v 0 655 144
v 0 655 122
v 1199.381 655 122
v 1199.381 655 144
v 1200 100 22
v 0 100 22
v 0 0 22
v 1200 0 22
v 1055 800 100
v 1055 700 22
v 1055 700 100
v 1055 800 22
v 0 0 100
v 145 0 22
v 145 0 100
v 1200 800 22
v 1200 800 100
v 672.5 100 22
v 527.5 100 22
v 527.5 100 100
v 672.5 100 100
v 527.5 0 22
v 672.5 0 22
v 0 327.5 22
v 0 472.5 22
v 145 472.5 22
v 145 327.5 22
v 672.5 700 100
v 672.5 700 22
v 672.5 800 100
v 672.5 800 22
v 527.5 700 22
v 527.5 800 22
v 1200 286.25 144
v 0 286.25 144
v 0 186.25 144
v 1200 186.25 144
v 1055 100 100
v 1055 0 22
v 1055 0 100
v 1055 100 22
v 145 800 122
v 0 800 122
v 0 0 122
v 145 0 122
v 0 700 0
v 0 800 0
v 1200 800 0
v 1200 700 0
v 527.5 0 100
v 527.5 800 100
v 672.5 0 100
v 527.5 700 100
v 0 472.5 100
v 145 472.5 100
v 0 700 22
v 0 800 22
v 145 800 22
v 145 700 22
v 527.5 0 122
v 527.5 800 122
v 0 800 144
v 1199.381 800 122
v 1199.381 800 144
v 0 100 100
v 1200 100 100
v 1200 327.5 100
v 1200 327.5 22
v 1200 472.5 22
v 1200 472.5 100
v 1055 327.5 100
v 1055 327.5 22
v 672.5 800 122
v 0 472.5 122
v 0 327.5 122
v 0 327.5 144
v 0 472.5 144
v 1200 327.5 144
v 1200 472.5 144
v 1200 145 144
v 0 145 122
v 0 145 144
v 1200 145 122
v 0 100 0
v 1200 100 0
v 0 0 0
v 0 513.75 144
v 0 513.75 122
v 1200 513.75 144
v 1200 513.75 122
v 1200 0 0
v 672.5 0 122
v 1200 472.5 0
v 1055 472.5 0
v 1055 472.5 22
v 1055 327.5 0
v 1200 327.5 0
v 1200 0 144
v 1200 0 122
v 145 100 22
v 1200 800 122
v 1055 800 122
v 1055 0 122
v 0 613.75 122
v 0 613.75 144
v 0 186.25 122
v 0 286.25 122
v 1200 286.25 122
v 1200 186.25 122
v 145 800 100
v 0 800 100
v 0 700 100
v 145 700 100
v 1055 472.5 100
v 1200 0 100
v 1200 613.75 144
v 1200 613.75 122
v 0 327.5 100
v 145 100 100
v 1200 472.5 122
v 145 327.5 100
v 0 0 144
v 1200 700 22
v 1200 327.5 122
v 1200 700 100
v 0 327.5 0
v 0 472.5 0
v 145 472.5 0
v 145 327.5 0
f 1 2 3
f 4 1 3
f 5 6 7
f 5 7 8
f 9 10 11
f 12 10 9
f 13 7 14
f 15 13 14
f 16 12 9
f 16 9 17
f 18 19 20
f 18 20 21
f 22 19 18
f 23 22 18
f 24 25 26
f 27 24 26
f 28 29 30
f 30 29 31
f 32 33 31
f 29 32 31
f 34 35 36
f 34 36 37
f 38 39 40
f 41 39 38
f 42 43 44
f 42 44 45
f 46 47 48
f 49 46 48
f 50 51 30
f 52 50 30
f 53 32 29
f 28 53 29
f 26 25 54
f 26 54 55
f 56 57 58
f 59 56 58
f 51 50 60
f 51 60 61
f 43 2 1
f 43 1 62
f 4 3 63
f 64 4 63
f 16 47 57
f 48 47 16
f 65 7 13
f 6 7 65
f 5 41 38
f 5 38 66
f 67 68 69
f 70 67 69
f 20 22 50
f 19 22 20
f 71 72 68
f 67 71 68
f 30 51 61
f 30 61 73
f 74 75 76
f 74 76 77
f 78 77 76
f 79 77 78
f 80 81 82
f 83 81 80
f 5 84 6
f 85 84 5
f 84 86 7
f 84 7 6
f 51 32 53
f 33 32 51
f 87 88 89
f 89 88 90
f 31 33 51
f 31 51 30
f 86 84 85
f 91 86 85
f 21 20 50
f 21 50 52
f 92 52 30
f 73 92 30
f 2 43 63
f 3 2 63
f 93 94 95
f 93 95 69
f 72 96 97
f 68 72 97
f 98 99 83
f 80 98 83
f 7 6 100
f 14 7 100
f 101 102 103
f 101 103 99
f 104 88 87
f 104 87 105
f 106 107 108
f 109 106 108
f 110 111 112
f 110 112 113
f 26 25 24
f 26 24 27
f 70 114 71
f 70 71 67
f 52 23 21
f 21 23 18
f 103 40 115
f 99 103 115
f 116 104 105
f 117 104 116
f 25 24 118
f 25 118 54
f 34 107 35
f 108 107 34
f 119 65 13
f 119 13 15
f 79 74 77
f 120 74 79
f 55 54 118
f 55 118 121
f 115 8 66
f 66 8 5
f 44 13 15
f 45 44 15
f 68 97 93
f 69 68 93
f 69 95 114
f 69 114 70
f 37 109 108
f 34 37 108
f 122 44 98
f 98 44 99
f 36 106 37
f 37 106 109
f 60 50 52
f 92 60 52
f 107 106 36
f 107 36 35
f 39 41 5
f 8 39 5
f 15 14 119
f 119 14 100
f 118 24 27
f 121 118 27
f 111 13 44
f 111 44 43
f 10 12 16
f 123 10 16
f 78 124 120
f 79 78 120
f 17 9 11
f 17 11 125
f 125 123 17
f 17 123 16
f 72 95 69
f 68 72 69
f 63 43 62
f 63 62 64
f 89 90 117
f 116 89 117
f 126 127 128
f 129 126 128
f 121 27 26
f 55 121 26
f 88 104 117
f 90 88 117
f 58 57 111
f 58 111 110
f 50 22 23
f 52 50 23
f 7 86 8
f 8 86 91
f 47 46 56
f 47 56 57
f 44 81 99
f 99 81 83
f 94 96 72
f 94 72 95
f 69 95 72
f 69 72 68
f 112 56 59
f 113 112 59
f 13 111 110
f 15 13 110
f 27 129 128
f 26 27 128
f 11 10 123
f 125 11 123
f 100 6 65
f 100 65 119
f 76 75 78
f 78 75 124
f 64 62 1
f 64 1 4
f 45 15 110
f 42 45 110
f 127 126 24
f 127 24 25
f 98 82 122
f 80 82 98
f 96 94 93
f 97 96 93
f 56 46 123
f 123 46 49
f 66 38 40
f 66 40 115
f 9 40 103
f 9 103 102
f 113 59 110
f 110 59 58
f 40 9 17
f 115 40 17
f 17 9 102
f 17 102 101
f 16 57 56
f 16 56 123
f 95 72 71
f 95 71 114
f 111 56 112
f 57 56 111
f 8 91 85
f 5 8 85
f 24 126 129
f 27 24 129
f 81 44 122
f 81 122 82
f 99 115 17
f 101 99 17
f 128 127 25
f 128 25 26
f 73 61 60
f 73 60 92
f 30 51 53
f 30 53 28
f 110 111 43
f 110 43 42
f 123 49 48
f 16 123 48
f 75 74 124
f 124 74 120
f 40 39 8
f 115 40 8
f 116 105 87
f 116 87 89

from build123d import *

# Parameters (mm, degrees)
F0_W     = 1200
F0_H     = 100
F0_W_2   = 145
F0_H_2   = 145
F1_DEPTH = 22
F2_W     = 145
F2_H     = 100
F2_H_2   = 145
F3_DEPTH = 78
F4_W     = 145
F4_H     = 800
F5_DEPTH = 22
F6_W     = 1200
F6_H     = 145
F6_W_2   = 1199.380994
F6_H_2   = 100
F7_DEPTH = 22


with BuildPart() as f1:
    # F0 (on Top) → F1 (new body)
    with BuildSketch(Plane.XY):
        with Locations((600, 750)):
            Rectangle(F0_W, F0_H)
        with Locations((600, 50)):
            Rectangle(F0_W, F0_H)
        with Locations((72.5, 400)):
            Rectangle(F0_W_2, F0_H_2)
        with Locations((1127.5, 400)):
            Rectangle(F0_W_2, F0_H_2)
    extrude(amount=F1_DEPTH)


with BuildPart() as f3:
    # F2 (on face) → F3 (new body)
    with BuildSketch(Plane.XY.offset(22)):
        with Locations((72.5, 750)):
            Rectangle(F2_W, F2_H)
        with Locations((1127.5, 750)):
            Rectangle(F2_W, F2_H)
        with Locations((1127.5, 400)):
            Rectangle(F2_W, F2_H_2)
        with Locations((72.5, 400)):
            Rectangle(F2_W, F2_H_2)
        with Locations((72.5, 50)):
            Rectangle(F2_W, F2_H)
        with Locations((1127.5, 50)):
            Rectangle(F2_W, F2_H)
        with Locations((600, 750)):
            Rectangle(F2_W, F2_H)
        with Locations((600, 50)):
            Rectangle(F2_W, F2_H)
    extrude(amount=F3_DEPTH)


with BuildPart() as f5:
    # F4 (on face) → F5 (new body)
    with BuildSketch(Plane.XY.offset(100)):
        with Locations((72.5, 400)):
            Rectangle(F4_W, F4_H)
        with Locations((600, 400)):
            Rectangle(F4_W, F4_H)
        with Locations((1127.5, 400)):
            Rectangle(F4_W, F4_H)
    extrude(amount=F5_DEPTH)


with BuildPart() as f7:
    # F6 (on face) → F7 (new body)
    with BuildSketch(Plane.XY.offset(122)):
        with Locations((600, 72.5)):
            Rectangle(F6_W, F6_H)
        with Locations((599.690497, 727.5)):
            Rectangle(F6_W_2, F6_H)
        with Locations((600, 563.75)):
            Rectangle(F6_W, F6_H_2)
        with Locations((600, 400)):
            Rectangle(F6_W, F6_H)
        with Locations((600, 236.25)):
            Rectangle(F6_W, F6_H_2)
    extrude(amount=F7_DEPTH)


solid = Compound([f1.part, f3.part, f5.part, f7.part])
